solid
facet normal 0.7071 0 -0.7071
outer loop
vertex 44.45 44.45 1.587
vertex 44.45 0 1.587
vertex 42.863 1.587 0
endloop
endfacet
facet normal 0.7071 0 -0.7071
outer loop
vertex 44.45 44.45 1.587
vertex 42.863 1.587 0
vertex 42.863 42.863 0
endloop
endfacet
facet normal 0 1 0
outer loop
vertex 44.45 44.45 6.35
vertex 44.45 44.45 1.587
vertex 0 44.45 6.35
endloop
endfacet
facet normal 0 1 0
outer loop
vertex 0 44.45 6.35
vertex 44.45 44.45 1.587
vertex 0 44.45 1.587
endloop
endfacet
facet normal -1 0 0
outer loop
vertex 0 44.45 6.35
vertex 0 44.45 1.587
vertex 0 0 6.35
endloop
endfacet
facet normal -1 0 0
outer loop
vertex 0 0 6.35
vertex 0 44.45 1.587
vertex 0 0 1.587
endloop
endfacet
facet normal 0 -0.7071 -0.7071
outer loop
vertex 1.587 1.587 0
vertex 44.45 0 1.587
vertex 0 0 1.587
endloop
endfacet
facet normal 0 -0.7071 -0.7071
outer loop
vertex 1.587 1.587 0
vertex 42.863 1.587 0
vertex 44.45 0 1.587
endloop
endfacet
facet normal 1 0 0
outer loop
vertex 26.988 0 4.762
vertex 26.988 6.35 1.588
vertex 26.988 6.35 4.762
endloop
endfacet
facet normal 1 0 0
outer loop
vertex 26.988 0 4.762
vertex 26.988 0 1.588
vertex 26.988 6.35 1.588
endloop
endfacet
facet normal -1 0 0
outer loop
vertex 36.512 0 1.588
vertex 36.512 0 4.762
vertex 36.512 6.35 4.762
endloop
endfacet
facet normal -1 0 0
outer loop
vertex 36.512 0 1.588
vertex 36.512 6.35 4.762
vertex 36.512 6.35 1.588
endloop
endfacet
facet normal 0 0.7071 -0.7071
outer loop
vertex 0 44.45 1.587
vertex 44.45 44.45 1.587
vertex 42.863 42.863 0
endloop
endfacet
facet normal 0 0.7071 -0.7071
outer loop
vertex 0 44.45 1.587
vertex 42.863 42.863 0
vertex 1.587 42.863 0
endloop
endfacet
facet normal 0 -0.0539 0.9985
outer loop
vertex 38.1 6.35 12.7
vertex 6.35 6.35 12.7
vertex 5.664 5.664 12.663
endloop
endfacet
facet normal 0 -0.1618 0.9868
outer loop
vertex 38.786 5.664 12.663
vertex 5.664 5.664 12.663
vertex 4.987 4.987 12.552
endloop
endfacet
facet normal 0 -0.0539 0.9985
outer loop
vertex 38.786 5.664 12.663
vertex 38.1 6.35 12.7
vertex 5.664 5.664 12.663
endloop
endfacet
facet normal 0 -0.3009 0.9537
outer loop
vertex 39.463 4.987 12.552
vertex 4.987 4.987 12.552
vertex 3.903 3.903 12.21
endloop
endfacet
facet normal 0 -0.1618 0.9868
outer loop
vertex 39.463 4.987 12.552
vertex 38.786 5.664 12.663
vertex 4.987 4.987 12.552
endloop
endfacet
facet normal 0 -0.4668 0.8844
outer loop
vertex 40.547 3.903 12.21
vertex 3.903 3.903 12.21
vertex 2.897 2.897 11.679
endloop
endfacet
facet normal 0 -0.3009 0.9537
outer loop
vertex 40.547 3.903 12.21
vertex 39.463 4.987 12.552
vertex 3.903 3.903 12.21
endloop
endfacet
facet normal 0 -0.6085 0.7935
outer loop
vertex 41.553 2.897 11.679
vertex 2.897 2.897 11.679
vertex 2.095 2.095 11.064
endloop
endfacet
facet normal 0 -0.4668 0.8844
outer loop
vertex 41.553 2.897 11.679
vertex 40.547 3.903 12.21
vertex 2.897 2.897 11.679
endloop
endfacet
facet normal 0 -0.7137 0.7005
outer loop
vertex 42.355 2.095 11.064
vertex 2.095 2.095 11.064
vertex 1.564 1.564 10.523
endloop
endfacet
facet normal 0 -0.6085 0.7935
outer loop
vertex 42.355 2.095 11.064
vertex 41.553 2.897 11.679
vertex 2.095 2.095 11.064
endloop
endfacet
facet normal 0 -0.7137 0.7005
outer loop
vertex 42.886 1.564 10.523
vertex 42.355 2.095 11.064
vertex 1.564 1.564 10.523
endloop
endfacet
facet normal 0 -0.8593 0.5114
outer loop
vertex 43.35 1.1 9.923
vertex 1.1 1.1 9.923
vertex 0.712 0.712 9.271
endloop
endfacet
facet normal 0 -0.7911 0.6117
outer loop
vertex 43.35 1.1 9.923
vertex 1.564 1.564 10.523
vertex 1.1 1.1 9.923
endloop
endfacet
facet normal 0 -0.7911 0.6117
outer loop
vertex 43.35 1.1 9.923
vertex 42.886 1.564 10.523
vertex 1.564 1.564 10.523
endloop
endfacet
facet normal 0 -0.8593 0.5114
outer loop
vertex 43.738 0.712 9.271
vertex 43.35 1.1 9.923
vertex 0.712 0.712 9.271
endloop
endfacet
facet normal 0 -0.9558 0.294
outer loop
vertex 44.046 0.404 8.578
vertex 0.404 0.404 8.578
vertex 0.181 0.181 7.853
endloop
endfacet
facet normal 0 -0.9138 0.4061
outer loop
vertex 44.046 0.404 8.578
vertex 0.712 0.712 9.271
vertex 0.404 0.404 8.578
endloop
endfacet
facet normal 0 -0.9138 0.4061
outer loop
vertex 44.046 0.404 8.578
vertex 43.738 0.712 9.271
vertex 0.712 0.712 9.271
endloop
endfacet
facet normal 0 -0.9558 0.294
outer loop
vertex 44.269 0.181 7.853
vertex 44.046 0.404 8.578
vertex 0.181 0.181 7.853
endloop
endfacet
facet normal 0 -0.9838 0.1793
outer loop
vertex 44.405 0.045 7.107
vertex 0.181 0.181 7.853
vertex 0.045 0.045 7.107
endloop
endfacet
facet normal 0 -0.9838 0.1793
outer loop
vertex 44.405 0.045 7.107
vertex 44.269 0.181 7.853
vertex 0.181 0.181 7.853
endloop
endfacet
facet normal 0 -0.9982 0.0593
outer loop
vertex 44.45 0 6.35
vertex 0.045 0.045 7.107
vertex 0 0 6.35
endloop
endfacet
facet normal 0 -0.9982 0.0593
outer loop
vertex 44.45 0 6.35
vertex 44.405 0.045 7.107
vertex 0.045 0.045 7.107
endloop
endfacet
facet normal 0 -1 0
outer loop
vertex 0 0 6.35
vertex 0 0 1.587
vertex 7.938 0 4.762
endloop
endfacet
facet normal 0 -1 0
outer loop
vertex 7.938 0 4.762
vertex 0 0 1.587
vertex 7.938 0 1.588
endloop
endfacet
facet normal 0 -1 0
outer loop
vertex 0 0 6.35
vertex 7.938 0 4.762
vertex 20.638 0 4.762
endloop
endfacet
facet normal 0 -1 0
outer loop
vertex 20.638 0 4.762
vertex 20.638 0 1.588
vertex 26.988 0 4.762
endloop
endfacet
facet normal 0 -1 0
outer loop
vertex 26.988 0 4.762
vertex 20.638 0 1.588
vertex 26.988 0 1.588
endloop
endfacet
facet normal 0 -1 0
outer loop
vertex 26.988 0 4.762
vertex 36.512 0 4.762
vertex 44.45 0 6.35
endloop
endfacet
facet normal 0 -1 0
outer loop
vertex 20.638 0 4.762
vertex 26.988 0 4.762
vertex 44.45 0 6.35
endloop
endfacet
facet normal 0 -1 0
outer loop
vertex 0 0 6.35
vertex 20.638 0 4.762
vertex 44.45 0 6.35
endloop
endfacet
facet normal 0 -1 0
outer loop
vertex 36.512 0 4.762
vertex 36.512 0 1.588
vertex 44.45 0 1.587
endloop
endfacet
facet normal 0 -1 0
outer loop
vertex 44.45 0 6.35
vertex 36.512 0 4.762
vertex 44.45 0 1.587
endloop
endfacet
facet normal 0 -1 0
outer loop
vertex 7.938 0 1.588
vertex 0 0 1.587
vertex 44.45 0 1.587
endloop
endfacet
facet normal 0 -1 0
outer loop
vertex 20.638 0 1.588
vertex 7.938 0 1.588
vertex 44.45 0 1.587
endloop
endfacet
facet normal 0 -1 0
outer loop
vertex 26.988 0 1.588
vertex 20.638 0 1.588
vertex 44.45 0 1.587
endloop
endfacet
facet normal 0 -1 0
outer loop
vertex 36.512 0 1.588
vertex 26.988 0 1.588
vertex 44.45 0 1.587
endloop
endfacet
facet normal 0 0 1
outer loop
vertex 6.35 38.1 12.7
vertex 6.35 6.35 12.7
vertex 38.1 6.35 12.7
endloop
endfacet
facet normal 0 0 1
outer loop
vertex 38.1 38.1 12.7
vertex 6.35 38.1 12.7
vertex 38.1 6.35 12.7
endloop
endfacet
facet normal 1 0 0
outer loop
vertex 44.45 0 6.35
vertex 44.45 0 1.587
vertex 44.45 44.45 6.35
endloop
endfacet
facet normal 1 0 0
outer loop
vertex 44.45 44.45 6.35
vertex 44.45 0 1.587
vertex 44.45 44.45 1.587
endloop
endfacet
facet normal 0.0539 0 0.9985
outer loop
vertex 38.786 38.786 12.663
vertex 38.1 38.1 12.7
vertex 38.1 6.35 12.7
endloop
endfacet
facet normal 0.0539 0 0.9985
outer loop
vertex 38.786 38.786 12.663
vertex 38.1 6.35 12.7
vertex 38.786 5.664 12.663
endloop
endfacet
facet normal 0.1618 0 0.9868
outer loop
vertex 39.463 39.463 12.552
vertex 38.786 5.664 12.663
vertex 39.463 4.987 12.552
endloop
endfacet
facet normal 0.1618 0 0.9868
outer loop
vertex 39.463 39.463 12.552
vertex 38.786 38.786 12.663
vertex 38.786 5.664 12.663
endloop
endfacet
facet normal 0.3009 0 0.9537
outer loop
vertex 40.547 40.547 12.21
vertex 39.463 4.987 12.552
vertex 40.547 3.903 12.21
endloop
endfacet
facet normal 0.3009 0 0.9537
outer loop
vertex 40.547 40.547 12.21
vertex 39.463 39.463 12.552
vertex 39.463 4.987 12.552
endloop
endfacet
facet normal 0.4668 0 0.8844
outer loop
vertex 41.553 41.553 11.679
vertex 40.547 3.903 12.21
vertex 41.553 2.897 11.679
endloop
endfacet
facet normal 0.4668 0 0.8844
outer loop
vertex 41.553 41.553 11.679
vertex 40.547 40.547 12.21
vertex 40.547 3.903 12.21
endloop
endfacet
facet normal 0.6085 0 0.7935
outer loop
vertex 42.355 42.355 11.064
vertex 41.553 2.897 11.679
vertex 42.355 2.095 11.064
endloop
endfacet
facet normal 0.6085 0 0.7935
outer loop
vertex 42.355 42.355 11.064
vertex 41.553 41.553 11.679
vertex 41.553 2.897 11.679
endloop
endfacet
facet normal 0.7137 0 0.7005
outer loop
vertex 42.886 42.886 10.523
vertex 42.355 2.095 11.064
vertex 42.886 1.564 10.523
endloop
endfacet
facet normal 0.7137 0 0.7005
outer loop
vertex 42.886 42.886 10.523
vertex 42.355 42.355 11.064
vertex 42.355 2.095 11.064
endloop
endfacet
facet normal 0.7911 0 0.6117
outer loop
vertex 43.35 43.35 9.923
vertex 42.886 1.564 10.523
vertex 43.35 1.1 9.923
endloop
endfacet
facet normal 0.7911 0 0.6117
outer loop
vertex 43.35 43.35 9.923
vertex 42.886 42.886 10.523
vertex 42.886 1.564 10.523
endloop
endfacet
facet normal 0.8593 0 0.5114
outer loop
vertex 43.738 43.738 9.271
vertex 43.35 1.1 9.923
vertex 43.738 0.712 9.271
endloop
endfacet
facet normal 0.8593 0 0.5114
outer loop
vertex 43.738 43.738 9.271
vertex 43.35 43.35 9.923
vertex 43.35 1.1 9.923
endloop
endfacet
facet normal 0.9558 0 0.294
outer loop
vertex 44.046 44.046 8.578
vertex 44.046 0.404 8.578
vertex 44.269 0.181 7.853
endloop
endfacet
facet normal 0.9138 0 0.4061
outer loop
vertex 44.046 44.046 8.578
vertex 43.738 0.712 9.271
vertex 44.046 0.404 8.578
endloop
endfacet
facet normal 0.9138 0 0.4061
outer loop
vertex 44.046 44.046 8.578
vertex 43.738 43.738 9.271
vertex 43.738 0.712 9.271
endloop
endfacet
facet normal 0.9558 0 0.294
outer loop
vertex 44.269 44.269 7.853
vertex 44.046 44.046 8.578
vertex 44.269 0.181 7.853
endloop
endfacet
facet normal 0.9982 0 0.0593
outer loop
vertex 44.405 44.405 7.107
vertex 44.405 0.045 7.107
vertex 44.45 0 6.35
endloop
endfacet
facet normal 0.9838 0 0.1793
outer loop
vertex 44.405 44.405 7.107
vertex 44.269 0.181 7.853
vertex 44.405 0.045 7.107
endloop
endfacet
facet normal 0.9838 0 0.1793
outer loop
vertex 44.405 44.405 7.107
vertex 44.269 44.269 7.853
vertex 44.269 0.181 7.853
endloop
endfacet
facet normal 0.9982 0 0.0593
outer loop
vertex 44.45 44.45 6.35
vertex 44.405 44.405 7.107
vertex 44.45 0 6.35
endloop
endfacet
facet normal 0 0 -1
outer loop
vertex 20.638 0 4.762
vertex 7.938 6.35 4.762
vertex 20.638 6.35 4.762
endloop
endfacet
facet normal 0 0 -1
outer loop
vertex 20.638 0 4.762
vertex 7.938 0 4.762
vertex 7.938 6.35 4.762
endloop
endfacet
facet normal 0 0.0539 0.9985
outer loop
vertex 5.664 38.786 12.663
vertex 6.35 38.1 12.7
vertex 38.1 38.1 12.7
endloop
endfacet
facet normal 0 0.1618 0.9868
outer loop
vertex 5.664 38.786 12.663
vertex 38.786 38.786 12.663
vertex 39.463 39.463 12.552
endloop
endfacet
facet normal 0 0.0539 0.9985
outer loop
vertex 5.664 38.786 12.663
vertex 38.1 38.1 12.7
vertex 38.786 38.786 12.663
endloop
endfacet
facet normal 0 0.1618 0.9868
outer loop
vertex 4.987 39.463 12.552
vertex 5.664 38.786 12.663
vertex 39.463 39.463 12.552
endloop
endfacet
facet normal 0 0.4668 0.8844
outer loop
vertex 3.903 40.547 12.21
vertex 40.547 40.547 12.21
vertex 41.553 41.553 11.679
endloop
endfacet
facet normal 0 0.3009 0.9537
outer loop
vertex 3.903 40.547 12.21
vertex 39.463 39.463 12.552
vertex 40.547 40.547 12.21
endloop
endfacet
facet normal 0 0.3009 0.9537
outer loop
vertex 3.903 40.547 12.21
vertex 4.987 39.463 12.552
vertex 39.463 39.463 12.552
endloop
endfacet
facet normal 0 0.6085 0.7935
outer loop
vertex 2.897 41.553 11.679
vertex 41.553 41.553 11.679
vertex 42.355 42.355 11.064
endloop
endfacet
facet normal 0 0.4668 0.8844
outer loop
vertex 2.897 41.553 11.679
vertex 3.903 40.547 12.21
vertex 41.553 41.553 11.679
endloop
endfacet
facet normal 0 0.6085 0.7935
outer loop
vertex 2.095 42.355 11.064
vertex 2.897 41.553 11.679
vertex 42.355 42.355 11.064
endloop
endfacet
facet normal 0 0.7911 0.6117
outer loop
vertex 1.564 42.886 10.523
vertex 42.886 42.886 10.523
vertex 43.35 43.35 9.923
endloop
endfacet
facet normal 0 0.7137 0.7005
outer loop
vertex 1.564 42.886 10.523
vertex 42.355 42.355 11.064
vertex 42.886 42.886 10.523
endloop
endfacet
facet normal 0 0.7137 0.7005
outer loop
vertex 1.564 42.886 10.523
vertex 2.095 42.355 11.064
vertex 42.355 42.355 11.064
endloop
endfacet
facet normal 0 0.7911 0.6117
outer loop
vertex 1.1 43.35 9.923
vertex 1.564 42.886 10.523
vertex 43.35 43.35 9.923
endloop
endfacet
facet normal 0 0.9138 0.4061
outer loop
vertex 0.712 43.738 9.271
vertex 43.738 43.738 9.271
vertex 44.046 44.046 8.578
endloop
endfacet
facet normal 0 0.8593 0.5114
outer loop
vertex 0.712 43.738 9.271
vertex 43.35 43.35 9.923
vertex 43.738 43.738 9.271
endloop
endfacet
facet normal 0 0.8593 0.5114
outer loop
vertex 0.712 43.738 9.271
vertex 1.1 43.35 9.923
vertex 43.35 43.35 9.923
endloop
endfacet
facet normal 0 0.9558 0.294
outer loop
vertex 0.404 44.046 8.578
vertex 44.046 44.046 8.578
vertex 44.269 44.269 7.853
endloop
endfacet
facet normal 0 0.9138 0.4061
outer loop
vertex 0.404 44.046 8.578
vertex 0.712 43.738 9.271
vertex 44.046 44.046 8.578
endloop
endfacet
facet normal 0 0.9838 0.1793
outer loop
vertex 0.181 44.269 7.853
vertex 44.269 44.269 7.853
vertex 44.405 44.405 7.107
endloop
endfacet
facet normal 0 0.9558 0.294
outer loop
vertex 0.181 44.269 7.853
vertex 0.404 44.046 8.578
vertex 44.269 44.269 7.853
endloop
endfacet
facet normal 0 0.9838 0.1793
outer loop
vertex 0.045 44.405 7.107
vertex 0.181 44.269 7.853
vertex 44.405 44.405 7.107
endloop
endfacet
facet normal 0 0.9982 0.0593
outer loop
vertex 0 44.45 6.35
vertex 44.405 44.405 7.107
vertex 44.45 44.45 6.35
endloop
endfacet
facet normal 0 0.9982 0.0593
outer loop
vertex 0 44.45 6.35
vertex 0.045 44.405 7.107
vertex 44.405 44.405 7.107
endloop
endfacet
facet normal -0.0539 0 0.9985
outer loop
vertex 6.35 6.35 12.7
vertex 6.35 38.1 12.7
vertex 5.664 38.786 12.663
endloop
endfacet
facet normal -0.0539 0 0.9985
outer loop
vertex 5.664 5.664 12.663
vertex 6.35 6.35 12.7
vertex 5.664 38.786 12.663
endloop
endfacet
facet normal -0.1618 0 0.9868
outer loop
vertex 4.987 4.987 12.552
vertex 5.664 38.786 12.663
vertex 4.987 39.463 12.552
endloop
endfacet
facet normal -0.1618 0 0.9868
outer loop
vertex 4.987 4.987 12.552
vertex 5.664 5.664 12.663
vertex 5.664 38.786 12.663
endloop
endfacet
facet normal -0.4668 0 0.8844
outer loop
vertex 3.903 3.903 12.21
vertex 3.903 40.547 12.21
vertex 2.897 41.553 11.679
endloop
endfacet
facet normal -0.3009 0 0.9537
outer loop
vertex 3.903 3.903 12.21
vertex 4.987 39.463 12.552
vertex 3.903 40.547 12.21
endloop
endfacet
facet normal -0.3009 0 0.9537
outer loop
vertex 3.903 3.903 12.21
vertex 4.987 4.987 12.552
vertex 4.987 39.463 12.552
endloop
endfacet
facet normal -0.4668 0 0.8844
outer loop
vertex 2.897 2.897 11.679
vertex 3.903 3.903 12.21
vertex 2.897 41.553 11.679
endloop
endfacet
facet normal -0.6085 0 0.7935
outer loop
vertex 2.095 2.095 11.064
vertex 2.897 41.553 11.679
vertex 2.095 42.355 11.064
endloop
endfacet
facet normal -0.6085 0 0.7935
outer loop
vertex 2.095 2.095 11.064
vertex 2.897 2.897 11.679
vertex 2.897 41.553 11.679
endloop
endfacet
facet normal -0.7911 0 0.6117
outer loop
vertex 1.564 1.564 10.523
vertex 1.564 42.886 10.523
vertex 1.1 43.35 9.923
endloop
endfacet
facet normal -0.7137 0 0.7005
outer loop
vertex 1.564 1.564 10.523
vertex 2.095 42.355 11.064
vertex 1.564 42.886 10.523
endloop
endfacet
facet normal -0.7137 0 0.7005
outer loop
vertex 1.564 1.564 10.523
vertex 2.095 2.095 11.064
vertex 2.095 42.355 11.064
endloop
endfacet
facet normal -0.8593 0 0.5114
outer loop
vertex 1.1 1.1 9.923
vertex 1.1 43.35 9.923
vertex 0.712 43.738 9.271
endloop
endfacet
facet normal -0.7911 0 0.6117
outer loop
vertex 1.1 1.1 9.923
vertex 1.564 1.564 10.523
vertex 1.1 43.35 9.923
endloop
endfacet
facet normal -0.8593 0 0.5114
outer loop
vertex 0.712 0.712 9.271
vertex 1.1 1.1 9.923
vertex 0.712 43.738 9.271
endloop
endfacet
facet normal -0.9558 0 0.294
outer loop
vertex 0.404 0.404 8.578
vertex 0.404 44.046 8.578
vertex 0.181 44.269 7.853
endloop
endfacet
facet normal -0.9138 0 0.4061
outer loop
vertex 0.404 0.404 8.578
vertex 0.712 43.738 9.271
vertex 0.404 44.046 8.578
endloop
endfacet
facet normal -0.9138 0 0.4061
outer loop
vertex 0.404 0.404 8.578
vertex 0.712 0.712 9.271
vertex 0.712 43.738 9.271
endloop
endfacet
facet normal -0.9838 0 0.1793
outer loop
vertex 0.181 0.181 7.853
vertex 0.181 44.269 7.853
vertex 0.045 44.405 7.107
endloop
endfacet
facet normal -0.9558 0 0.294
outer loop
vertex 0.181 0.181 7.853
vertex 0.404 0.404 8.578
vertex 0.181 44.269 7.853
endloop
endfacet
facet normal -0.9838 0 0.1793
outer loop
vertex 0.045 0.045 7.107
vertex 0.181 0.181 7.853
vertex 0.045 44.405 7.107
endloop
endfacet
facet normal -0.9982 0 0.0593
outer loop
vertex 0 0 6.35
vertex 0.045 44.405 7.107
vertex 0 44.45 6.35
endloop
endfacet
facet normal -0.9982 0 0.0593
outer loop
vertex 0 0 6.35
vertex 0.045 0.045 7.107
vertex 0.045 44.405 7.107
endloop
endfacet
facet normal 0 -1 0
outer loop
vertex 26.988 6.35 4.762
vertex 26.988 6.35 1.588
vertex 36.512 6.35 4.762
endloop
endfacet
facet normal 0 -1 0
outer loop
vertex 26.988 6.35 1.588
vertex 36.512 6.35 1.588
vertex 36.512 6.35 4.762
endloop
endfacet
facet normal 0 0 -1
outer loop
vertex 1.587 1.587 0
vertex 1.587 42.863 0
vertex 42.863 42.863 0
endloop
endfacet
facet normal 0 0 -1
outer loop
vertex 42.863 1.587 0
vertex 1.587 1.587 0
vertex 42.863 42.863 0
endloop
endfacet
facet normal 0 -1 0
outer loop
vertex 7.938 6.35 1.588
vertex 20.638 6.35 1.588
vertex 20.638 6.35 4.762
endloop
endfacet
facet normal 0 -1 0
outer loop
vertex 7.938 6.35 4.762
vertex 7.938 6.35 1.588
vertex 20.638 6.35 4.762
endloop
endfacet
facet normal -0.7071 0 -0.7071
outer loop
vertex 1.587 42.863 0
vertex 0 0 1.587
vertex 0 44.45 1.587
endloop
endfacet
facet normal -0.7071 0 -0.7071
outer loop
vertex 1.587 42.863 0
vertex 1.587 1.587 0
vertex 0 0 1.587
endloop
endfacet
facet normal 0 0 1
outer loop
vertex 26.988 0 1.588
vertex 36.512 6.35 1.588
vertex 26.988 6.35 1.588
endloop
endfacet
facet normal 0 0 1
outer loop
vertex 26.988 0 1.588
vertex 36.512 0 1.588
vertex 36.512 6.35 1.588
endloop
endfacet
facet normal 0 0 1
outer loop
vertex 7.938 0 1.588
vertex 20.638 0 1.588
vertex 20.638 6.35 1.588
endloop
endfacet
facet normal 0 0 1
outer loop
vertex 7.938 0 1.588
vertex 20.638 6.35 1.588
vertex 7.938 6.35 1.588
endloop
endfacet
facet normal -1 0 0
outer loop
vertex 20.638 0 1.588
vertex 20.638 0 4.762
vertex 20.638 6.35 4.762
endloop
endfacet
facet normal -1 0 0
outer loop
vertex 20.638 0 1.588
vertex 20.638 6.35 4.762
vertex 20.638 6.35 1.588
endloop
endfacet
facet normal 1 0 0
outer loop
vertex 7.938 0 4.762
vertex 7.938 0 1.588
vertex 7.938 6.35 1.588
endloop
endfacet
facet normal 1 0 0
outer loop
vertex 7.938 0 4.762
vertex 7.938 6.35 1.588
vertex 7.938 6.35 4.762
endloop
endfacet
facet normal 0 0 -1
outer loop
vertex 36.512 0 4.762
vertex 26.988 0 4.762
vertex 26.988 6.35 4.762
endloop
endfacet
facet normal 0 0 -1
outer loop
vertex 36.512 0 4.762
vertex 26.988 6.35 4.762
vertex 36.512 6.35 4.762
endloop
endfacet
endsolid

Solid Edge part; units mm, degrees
sketch "Sketch1" plane through (0, 0, 0) normal (0, 0, 1) x (1, 0, 0)
  line L0 (0, 0) -> (44.45, 0)
  line L1 (44.45, 0) -> (44.45, 44.45)
  line L2 (44.45, 44.45) -> (0, 44.45)
  line L3 (0, 44.45) -> (0, 0)
  dimension "D1" = 44.45
  dimension "D2" = 44.45
extrude "Protrusion1" add sketch "Sketch1" along normal blind 12.7
fillet "Round_1" radius 6.35 4 edges at (22.225, 0, 12.7) (0, 22.225, 12.7) (22.225, 44.45, 12.7) (44.45, 22.225, 12.7)
sketch "Sketch2" plane through (22.225, 0, 3.175) normal (0, -1, 0) x (1, 0, 0)
  line L0 (14.2875, -1.5875) -> (4.7625, -1.5875)
  line L1 (4.7625, -1.5875) -> (4.7625, 1.5875)
  line L2 (4.7625, 1.5875) -> (14.2875, 1.5875)
  line L3 (14.2875, 1.5875) -> (14.2875, -1.5875)
  line L4 (-1.5875, -1.5875) -> (-14.2875, -1.5875)
  line L5 (-14.2875, -1.5875) -> (-14.2875, 1.5875)
  line L6 (-14.2875, 1.5875) -> (-1.5875, 1.5875)
  line L7 (-1.5875, 1.5875) -> (-1.5875, -1.5875)
  dimension "D1" = 6.35
  dimension "D2" = 12.7
  dimension "D3" = 7.9375
  dimension "D4" = 9.525
  dimension "D5" = 3.175
  dimension "D6" = 1.5875
extrude "ExtrudedCutout_1" cut sketch "Sketch2" against normal blind 6.35
chamfer "Chamfer_1" distance 1.5875 angle 45 4 edges at (22.225, 0, 0) (0, 22.225, 0) (44.45, 22.225, 0) (22.225, 44.45, 0)
properties material "ABS Plastic, high impact"
